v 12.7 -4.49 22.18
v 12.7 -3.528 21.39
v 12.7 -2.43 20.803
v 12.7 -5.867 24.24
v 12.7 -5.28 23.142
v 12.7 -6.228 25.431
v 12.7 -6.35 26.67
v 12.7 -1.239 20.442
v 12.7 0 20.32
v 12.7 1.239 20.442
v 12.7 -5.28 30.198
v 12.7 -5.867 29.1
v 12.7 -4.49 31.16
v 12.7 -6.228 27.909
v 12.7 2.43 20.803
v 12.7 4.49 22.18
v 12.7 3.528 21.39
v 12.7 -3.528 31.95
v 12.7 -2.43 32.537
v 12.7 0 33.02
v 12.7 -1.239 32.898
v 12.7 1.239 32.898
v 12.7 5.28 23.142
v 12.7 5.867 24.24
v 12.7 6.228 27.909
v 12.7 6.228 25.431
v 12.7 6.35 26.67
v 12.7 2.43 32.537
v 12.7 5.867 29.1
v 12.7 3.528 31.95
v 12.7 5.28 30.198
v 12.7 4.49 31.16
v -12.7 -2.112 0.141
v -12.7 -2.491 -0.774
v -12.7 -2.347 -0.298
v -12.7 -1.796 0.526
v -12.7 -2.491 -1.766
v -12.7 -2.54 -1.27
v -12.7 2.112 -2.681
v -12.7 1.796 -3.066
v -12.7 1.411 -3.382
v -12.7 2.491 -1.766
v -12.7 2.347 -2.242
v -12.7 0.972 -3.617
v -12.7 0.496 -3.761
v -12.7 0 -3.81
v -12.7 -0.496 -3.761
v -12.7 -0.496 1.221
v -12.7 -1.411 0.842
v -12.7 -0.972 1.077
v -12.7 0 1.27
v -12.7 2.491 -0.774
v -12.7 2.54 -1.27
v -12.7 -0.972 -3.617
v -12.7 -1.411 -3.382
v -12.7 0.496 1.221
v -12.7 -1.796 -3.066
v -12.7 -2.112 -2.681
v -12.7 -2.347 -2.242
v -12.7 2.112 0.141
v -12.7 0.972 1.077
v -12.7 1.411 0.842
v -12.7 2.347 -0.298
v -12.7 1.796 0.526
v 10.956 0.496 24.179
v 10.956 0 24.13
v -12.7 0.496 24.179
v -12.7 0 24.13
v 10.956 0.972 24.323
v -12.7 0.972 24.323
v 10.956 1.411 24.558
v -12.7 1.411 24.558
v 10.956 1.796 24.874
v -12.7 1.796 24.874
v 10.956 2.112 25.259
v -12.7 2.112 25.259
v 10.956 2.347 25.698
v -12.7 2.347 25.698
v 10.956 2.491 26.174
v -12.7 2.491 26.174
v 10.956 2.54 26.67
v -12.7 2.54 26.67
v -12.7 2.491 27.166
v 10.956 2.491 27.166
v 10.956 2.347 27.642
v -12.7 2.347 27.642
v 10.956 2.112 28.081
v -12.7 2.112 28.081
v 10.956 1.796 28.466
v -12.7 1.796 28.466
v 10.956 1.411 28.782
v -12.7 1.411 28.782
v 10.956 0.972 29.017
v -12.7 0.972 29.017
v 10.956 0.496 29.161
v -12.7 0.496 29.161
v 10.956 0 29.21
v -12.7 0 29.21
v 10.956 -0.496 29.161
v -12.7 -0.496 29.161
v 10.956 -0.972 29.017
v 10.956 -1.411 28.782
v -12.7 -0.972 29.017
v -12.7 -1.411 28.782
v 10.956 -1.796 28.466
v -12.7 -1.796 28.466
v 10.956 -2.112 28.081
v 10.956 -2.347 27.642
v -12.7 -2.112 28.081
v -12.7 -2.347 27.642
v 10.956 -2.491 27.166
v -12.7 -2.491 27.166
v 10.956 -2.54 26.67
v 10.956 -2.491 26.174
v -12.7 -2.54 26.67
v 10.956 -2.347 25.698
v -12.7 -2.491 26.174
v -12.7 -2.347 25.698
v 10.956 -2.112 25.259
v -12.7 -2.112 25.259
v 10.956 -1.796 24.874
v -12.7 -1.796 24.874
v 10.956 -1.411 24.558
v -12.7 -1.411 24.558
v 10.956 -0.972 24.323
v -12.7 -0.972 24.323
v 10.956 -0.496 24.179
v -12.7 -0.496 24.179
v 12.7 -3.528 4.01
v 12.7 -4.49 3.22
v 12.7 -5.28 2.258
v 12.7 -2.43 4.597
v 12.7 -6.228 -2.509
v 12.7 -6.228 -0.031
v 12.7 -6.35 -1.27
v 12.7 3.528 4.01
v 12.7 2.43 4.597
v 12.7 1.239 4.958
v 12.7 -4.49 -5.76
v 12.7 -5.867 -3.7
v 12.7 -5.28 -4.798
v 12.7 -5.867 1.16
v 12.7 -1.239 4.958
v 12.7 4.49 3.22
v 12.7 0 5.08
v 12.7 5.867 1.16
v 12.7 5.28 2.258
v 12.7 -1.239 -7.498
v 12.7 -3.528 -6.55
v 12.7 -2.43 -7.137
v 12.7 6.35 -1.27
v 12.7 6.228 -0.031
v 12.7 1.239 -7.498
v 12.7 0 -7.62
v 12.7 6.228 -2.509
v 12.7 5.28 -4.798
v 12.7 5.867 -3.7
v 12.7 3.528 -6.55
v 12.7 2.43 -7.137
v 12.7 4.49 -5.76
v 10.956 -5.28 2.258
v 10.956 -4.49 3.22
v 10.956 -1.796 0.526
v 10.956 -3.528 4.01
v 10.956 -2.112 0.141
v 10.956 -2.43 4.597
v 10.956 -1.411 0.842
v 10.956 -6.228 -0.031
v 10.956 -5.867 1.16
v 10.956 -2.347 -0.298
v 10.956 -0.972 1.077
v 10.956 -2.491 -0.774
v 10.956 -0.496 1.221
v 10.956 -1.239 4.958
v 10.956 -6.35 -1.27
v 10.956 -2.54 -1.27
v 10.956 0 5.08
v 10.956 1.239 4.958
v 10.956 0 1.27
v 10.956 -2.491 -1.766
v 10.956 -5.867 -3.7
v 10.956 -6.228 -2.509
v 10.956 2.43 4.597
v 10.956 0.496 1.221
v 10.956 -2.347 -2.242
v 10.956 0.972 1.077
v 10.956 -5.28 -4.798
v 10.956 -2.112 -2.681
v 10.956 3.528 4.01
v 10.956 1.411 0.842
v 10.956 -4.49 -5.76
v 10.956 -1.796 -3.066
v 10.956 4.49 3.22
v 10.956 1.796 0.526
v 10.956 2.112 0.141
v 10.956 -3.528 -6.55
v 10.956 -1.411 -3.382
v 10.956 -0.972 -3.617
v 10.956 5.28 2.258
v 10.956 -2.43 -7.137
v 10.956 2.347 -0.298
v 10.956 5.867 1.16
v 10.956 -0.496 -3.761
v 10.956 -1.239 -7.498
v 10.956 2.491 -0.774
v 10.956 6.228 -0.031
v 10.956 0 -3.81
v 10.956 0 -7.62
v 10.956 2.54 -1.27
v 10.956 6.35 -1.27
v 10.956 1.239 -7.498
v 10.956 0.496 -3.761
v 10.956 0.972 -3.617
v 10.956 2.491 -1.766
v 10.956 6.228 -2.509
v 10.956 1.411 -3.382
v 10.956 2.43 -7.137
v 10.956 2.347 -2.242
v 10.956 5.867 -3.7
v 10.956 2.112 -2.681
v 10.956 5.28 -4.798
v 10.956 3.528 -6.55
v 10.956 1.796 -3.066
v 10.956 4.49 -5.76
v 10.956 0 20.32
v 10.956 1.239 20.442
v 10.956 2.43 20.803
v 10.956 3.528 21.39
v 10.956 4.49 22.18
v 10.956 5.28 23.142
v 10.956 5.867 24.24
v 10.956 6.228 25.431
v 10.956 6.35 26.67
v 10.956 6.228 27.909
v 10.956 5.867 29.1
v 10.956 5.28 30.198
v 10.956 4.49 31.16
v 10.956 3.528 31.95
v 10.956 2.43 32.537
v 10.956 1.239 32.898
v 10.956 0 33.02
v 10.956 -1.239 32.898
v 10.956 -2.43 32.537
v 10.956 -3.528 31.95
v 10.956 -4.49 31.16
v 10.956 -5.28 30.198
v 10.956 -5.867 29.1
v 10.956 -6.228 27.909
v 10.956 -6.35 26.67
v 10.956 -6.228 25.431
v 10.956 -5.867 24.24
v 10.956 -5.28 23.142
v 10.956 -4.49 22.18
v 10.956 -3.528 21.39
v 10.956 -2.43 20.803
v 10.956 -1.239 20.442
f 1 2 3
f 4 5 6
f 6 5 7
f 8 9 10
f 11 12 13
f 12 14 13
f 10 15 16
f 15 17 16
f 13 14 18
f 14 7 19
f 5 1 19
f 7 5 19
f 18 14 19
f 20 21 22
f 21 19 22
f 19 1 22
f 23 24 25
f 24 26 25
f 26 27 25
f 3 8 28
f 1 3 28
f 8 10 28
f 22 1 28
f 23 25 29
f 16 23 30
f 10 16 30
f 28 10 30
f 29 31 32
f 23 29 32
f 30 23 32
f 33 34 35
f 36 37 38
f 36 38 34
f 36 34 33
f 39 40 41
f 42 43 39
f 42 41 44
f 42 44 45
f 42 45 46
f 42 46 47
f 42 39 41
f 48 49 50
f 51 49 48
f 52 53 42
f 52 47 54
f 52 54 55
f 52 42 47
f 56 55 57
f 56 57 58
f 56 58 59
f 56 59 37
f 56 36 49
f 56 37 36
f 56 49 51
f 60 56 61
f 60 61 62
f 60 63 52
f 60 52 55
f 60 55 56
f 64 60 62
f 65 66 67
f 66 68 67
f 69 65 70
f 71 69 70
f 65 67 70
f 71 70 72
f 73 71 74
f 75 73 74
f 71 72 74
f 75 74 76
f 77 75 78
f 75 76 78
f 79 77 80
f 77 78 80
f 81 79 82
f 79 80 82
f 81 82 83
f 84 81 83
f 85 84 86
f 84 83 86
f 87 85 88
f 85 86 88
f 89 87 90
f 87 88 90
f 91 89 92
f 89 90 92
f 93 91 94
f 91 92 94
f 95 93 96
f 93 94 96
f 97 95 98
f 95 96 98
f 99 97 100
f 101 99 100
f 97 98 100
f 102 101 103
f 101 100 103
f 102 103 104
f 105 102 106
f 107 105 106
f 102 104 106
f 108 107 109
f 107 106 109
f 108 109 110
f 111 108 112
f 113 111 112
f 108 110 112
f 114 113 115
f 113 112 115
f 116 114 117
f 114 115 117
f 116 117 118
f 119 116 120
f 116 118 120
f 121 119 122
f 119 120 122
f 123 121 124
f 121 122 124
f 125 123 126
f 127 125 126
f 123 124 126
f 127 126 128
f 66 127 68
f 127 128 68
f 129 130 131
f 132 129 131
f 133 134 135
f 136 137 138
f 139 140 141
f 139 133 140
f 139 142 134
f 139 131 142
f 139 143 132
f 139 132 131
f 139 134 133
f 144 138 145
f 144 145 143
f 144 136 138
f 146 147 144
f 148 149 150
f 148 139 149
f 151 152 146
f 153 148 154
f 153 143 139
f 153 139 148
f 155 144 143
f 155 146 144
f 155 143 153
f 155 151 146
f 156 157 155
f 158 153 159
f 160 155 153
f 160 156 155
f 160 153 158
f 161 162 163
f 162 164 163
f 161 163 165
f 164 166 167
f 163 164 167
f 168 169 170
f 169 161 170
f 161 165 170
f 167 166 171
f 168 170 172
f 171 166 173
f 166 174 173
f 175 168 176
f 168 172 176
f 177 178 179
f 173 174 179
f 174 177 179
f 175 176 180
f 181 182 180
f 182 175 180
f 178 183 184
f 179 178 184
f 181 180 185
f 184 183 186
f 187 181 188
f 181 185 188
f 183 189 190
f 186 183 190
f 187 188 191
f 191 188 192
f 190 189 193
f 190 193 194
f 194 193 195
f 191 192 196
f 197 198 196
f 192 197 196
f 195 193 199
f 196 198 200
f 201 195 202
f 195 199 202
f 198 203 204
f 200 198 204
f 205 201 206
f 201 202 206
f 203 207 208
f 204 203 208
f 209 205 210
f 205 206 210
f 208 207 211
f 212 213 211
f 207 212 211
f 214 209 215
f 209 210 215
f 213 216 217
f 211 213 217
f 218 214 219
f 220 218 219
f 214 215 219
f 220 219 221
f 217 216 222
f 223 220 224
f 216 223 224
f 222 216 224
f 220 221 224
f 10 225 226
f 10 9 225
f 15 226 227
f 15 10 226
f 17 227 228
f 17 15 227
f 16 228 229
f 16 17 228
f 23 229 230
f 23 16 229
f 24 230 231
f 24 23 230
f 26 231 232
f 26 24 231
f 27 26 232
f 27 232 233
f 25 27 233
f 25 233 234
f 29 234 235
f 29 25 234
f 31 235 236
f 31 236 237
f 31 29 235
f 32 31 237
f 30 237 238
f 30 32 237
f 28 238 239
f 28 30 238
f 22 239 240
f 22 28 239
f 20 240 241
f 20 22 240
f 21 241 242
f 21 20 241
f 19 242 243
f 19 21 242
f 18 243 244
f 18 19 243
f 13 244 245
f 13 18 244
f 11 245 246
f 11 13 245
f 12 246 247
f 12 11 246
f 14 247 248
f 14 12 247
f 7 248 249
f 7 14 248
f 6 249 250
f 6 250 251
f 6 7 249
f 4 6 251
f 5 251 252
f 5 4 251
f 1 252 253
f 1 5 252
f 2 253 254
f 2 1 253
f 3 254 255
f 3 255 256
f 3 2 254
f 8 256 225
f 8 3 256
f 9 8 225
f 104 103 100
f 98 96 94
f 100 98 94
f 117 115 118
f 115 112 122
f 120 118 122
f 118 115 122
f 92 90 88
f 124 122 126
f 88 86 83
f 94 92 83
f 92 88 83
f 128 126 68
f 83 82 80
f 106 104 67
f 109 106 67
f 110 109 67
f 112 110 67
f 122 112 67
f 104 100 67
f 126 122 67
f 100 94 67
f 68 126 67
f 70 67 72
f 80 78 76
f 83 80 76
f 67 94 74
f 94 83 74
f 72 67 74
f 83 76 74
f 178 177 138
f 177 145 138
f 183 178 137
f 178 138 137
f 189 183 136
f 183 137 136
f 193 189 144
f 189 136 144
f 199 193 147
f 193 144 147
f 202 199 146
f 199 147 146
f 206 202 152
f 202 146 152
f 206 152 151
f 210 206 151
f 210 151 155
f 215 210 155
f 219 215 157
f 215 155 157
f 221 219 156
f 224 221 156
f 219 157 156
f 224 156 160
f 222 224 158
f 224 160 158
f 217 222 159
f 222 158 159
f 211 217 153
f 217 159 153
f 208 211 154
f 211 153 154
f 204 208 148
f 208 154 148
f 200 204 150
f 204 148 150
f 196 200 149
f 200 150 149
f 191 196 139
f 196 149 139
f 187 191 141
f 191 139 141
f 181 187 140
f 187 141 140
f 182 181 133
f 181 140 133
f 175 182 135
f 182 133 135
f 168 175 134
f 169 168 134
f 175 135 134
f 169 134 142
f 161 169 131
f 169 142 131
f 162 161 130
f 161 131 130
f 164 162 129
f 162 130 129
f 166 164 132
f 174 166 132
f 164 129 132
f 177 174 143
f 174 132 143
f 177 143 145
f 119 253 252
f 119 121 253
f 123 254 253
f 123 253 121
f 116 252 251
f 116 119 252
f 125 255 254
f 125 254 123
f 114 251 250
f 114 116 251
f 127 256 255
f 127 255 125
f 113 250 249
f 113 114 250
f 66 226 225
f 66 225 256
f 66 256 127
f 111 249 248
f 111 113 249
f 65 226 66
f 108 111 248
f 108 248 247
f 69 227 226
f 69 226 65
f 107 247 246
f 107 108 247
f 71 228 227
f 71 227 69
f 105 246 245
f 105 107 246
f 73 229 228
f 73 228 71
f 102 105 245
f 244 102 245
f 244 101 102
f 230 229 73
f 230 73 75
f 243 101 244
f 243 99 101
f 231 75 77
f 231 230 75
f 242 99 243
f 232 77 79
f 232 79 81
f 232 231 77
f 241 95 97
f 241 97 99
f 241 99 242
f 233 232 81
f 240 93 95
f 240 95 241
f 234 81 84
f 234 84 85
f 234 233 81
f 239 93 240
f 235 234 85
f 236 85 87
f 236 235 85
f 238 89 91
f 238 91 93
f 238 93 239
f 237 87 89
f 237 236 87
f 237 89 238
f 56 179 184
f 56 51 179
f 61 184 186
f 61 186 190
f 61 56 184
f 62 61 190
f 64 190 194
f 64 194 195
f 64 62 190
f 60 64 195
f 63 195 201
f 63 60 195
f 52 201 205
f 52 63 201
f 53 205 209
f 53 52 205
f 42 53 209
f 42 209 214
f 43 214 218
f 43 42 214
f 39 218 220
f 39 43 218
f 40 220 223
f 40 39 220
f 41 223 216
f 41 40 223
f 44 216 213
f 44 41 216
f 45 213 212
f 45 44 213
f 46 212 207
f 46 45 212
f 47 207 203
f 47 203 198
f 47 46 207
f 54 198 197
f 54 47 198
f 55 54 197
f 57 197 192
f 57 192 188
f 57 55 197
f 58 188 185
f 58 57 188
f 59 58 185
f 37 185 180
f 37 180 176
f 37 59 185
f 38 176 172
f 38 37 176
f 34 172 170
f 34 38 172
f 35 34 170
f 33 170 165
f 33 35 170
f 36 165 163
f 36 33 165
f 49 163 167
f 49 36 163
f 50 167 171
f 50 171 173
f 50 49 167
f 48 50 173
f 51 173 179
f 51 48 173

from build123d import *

# Parameters (mm, degrees)
F0_W = 1.743612
F0_H = 3.81


with BuildPart() as f1:
    # F0 (on Front) → F1 (revolve)
    with BuildSketch(Plane.XZ):
        Polygon((-12.7, -1.27), (12.7, -1.27), (12.7, 1.27), (10.956388, 1.27), (-12.7, 1.27), align=None)
        with Locations((11.828194, 3.175)):
            Rectangle(F0_W, F0_H)
    revolve(axis=Axis((0, 0, -1.27), (-1, 0, 0)))


with BuildPart() as f3_1:
    # F3: instance of F1
    add(f1.part.mirror(Plane.XY.offset(12.7)))


solid = Compound([f1.part, f3_1.part])
